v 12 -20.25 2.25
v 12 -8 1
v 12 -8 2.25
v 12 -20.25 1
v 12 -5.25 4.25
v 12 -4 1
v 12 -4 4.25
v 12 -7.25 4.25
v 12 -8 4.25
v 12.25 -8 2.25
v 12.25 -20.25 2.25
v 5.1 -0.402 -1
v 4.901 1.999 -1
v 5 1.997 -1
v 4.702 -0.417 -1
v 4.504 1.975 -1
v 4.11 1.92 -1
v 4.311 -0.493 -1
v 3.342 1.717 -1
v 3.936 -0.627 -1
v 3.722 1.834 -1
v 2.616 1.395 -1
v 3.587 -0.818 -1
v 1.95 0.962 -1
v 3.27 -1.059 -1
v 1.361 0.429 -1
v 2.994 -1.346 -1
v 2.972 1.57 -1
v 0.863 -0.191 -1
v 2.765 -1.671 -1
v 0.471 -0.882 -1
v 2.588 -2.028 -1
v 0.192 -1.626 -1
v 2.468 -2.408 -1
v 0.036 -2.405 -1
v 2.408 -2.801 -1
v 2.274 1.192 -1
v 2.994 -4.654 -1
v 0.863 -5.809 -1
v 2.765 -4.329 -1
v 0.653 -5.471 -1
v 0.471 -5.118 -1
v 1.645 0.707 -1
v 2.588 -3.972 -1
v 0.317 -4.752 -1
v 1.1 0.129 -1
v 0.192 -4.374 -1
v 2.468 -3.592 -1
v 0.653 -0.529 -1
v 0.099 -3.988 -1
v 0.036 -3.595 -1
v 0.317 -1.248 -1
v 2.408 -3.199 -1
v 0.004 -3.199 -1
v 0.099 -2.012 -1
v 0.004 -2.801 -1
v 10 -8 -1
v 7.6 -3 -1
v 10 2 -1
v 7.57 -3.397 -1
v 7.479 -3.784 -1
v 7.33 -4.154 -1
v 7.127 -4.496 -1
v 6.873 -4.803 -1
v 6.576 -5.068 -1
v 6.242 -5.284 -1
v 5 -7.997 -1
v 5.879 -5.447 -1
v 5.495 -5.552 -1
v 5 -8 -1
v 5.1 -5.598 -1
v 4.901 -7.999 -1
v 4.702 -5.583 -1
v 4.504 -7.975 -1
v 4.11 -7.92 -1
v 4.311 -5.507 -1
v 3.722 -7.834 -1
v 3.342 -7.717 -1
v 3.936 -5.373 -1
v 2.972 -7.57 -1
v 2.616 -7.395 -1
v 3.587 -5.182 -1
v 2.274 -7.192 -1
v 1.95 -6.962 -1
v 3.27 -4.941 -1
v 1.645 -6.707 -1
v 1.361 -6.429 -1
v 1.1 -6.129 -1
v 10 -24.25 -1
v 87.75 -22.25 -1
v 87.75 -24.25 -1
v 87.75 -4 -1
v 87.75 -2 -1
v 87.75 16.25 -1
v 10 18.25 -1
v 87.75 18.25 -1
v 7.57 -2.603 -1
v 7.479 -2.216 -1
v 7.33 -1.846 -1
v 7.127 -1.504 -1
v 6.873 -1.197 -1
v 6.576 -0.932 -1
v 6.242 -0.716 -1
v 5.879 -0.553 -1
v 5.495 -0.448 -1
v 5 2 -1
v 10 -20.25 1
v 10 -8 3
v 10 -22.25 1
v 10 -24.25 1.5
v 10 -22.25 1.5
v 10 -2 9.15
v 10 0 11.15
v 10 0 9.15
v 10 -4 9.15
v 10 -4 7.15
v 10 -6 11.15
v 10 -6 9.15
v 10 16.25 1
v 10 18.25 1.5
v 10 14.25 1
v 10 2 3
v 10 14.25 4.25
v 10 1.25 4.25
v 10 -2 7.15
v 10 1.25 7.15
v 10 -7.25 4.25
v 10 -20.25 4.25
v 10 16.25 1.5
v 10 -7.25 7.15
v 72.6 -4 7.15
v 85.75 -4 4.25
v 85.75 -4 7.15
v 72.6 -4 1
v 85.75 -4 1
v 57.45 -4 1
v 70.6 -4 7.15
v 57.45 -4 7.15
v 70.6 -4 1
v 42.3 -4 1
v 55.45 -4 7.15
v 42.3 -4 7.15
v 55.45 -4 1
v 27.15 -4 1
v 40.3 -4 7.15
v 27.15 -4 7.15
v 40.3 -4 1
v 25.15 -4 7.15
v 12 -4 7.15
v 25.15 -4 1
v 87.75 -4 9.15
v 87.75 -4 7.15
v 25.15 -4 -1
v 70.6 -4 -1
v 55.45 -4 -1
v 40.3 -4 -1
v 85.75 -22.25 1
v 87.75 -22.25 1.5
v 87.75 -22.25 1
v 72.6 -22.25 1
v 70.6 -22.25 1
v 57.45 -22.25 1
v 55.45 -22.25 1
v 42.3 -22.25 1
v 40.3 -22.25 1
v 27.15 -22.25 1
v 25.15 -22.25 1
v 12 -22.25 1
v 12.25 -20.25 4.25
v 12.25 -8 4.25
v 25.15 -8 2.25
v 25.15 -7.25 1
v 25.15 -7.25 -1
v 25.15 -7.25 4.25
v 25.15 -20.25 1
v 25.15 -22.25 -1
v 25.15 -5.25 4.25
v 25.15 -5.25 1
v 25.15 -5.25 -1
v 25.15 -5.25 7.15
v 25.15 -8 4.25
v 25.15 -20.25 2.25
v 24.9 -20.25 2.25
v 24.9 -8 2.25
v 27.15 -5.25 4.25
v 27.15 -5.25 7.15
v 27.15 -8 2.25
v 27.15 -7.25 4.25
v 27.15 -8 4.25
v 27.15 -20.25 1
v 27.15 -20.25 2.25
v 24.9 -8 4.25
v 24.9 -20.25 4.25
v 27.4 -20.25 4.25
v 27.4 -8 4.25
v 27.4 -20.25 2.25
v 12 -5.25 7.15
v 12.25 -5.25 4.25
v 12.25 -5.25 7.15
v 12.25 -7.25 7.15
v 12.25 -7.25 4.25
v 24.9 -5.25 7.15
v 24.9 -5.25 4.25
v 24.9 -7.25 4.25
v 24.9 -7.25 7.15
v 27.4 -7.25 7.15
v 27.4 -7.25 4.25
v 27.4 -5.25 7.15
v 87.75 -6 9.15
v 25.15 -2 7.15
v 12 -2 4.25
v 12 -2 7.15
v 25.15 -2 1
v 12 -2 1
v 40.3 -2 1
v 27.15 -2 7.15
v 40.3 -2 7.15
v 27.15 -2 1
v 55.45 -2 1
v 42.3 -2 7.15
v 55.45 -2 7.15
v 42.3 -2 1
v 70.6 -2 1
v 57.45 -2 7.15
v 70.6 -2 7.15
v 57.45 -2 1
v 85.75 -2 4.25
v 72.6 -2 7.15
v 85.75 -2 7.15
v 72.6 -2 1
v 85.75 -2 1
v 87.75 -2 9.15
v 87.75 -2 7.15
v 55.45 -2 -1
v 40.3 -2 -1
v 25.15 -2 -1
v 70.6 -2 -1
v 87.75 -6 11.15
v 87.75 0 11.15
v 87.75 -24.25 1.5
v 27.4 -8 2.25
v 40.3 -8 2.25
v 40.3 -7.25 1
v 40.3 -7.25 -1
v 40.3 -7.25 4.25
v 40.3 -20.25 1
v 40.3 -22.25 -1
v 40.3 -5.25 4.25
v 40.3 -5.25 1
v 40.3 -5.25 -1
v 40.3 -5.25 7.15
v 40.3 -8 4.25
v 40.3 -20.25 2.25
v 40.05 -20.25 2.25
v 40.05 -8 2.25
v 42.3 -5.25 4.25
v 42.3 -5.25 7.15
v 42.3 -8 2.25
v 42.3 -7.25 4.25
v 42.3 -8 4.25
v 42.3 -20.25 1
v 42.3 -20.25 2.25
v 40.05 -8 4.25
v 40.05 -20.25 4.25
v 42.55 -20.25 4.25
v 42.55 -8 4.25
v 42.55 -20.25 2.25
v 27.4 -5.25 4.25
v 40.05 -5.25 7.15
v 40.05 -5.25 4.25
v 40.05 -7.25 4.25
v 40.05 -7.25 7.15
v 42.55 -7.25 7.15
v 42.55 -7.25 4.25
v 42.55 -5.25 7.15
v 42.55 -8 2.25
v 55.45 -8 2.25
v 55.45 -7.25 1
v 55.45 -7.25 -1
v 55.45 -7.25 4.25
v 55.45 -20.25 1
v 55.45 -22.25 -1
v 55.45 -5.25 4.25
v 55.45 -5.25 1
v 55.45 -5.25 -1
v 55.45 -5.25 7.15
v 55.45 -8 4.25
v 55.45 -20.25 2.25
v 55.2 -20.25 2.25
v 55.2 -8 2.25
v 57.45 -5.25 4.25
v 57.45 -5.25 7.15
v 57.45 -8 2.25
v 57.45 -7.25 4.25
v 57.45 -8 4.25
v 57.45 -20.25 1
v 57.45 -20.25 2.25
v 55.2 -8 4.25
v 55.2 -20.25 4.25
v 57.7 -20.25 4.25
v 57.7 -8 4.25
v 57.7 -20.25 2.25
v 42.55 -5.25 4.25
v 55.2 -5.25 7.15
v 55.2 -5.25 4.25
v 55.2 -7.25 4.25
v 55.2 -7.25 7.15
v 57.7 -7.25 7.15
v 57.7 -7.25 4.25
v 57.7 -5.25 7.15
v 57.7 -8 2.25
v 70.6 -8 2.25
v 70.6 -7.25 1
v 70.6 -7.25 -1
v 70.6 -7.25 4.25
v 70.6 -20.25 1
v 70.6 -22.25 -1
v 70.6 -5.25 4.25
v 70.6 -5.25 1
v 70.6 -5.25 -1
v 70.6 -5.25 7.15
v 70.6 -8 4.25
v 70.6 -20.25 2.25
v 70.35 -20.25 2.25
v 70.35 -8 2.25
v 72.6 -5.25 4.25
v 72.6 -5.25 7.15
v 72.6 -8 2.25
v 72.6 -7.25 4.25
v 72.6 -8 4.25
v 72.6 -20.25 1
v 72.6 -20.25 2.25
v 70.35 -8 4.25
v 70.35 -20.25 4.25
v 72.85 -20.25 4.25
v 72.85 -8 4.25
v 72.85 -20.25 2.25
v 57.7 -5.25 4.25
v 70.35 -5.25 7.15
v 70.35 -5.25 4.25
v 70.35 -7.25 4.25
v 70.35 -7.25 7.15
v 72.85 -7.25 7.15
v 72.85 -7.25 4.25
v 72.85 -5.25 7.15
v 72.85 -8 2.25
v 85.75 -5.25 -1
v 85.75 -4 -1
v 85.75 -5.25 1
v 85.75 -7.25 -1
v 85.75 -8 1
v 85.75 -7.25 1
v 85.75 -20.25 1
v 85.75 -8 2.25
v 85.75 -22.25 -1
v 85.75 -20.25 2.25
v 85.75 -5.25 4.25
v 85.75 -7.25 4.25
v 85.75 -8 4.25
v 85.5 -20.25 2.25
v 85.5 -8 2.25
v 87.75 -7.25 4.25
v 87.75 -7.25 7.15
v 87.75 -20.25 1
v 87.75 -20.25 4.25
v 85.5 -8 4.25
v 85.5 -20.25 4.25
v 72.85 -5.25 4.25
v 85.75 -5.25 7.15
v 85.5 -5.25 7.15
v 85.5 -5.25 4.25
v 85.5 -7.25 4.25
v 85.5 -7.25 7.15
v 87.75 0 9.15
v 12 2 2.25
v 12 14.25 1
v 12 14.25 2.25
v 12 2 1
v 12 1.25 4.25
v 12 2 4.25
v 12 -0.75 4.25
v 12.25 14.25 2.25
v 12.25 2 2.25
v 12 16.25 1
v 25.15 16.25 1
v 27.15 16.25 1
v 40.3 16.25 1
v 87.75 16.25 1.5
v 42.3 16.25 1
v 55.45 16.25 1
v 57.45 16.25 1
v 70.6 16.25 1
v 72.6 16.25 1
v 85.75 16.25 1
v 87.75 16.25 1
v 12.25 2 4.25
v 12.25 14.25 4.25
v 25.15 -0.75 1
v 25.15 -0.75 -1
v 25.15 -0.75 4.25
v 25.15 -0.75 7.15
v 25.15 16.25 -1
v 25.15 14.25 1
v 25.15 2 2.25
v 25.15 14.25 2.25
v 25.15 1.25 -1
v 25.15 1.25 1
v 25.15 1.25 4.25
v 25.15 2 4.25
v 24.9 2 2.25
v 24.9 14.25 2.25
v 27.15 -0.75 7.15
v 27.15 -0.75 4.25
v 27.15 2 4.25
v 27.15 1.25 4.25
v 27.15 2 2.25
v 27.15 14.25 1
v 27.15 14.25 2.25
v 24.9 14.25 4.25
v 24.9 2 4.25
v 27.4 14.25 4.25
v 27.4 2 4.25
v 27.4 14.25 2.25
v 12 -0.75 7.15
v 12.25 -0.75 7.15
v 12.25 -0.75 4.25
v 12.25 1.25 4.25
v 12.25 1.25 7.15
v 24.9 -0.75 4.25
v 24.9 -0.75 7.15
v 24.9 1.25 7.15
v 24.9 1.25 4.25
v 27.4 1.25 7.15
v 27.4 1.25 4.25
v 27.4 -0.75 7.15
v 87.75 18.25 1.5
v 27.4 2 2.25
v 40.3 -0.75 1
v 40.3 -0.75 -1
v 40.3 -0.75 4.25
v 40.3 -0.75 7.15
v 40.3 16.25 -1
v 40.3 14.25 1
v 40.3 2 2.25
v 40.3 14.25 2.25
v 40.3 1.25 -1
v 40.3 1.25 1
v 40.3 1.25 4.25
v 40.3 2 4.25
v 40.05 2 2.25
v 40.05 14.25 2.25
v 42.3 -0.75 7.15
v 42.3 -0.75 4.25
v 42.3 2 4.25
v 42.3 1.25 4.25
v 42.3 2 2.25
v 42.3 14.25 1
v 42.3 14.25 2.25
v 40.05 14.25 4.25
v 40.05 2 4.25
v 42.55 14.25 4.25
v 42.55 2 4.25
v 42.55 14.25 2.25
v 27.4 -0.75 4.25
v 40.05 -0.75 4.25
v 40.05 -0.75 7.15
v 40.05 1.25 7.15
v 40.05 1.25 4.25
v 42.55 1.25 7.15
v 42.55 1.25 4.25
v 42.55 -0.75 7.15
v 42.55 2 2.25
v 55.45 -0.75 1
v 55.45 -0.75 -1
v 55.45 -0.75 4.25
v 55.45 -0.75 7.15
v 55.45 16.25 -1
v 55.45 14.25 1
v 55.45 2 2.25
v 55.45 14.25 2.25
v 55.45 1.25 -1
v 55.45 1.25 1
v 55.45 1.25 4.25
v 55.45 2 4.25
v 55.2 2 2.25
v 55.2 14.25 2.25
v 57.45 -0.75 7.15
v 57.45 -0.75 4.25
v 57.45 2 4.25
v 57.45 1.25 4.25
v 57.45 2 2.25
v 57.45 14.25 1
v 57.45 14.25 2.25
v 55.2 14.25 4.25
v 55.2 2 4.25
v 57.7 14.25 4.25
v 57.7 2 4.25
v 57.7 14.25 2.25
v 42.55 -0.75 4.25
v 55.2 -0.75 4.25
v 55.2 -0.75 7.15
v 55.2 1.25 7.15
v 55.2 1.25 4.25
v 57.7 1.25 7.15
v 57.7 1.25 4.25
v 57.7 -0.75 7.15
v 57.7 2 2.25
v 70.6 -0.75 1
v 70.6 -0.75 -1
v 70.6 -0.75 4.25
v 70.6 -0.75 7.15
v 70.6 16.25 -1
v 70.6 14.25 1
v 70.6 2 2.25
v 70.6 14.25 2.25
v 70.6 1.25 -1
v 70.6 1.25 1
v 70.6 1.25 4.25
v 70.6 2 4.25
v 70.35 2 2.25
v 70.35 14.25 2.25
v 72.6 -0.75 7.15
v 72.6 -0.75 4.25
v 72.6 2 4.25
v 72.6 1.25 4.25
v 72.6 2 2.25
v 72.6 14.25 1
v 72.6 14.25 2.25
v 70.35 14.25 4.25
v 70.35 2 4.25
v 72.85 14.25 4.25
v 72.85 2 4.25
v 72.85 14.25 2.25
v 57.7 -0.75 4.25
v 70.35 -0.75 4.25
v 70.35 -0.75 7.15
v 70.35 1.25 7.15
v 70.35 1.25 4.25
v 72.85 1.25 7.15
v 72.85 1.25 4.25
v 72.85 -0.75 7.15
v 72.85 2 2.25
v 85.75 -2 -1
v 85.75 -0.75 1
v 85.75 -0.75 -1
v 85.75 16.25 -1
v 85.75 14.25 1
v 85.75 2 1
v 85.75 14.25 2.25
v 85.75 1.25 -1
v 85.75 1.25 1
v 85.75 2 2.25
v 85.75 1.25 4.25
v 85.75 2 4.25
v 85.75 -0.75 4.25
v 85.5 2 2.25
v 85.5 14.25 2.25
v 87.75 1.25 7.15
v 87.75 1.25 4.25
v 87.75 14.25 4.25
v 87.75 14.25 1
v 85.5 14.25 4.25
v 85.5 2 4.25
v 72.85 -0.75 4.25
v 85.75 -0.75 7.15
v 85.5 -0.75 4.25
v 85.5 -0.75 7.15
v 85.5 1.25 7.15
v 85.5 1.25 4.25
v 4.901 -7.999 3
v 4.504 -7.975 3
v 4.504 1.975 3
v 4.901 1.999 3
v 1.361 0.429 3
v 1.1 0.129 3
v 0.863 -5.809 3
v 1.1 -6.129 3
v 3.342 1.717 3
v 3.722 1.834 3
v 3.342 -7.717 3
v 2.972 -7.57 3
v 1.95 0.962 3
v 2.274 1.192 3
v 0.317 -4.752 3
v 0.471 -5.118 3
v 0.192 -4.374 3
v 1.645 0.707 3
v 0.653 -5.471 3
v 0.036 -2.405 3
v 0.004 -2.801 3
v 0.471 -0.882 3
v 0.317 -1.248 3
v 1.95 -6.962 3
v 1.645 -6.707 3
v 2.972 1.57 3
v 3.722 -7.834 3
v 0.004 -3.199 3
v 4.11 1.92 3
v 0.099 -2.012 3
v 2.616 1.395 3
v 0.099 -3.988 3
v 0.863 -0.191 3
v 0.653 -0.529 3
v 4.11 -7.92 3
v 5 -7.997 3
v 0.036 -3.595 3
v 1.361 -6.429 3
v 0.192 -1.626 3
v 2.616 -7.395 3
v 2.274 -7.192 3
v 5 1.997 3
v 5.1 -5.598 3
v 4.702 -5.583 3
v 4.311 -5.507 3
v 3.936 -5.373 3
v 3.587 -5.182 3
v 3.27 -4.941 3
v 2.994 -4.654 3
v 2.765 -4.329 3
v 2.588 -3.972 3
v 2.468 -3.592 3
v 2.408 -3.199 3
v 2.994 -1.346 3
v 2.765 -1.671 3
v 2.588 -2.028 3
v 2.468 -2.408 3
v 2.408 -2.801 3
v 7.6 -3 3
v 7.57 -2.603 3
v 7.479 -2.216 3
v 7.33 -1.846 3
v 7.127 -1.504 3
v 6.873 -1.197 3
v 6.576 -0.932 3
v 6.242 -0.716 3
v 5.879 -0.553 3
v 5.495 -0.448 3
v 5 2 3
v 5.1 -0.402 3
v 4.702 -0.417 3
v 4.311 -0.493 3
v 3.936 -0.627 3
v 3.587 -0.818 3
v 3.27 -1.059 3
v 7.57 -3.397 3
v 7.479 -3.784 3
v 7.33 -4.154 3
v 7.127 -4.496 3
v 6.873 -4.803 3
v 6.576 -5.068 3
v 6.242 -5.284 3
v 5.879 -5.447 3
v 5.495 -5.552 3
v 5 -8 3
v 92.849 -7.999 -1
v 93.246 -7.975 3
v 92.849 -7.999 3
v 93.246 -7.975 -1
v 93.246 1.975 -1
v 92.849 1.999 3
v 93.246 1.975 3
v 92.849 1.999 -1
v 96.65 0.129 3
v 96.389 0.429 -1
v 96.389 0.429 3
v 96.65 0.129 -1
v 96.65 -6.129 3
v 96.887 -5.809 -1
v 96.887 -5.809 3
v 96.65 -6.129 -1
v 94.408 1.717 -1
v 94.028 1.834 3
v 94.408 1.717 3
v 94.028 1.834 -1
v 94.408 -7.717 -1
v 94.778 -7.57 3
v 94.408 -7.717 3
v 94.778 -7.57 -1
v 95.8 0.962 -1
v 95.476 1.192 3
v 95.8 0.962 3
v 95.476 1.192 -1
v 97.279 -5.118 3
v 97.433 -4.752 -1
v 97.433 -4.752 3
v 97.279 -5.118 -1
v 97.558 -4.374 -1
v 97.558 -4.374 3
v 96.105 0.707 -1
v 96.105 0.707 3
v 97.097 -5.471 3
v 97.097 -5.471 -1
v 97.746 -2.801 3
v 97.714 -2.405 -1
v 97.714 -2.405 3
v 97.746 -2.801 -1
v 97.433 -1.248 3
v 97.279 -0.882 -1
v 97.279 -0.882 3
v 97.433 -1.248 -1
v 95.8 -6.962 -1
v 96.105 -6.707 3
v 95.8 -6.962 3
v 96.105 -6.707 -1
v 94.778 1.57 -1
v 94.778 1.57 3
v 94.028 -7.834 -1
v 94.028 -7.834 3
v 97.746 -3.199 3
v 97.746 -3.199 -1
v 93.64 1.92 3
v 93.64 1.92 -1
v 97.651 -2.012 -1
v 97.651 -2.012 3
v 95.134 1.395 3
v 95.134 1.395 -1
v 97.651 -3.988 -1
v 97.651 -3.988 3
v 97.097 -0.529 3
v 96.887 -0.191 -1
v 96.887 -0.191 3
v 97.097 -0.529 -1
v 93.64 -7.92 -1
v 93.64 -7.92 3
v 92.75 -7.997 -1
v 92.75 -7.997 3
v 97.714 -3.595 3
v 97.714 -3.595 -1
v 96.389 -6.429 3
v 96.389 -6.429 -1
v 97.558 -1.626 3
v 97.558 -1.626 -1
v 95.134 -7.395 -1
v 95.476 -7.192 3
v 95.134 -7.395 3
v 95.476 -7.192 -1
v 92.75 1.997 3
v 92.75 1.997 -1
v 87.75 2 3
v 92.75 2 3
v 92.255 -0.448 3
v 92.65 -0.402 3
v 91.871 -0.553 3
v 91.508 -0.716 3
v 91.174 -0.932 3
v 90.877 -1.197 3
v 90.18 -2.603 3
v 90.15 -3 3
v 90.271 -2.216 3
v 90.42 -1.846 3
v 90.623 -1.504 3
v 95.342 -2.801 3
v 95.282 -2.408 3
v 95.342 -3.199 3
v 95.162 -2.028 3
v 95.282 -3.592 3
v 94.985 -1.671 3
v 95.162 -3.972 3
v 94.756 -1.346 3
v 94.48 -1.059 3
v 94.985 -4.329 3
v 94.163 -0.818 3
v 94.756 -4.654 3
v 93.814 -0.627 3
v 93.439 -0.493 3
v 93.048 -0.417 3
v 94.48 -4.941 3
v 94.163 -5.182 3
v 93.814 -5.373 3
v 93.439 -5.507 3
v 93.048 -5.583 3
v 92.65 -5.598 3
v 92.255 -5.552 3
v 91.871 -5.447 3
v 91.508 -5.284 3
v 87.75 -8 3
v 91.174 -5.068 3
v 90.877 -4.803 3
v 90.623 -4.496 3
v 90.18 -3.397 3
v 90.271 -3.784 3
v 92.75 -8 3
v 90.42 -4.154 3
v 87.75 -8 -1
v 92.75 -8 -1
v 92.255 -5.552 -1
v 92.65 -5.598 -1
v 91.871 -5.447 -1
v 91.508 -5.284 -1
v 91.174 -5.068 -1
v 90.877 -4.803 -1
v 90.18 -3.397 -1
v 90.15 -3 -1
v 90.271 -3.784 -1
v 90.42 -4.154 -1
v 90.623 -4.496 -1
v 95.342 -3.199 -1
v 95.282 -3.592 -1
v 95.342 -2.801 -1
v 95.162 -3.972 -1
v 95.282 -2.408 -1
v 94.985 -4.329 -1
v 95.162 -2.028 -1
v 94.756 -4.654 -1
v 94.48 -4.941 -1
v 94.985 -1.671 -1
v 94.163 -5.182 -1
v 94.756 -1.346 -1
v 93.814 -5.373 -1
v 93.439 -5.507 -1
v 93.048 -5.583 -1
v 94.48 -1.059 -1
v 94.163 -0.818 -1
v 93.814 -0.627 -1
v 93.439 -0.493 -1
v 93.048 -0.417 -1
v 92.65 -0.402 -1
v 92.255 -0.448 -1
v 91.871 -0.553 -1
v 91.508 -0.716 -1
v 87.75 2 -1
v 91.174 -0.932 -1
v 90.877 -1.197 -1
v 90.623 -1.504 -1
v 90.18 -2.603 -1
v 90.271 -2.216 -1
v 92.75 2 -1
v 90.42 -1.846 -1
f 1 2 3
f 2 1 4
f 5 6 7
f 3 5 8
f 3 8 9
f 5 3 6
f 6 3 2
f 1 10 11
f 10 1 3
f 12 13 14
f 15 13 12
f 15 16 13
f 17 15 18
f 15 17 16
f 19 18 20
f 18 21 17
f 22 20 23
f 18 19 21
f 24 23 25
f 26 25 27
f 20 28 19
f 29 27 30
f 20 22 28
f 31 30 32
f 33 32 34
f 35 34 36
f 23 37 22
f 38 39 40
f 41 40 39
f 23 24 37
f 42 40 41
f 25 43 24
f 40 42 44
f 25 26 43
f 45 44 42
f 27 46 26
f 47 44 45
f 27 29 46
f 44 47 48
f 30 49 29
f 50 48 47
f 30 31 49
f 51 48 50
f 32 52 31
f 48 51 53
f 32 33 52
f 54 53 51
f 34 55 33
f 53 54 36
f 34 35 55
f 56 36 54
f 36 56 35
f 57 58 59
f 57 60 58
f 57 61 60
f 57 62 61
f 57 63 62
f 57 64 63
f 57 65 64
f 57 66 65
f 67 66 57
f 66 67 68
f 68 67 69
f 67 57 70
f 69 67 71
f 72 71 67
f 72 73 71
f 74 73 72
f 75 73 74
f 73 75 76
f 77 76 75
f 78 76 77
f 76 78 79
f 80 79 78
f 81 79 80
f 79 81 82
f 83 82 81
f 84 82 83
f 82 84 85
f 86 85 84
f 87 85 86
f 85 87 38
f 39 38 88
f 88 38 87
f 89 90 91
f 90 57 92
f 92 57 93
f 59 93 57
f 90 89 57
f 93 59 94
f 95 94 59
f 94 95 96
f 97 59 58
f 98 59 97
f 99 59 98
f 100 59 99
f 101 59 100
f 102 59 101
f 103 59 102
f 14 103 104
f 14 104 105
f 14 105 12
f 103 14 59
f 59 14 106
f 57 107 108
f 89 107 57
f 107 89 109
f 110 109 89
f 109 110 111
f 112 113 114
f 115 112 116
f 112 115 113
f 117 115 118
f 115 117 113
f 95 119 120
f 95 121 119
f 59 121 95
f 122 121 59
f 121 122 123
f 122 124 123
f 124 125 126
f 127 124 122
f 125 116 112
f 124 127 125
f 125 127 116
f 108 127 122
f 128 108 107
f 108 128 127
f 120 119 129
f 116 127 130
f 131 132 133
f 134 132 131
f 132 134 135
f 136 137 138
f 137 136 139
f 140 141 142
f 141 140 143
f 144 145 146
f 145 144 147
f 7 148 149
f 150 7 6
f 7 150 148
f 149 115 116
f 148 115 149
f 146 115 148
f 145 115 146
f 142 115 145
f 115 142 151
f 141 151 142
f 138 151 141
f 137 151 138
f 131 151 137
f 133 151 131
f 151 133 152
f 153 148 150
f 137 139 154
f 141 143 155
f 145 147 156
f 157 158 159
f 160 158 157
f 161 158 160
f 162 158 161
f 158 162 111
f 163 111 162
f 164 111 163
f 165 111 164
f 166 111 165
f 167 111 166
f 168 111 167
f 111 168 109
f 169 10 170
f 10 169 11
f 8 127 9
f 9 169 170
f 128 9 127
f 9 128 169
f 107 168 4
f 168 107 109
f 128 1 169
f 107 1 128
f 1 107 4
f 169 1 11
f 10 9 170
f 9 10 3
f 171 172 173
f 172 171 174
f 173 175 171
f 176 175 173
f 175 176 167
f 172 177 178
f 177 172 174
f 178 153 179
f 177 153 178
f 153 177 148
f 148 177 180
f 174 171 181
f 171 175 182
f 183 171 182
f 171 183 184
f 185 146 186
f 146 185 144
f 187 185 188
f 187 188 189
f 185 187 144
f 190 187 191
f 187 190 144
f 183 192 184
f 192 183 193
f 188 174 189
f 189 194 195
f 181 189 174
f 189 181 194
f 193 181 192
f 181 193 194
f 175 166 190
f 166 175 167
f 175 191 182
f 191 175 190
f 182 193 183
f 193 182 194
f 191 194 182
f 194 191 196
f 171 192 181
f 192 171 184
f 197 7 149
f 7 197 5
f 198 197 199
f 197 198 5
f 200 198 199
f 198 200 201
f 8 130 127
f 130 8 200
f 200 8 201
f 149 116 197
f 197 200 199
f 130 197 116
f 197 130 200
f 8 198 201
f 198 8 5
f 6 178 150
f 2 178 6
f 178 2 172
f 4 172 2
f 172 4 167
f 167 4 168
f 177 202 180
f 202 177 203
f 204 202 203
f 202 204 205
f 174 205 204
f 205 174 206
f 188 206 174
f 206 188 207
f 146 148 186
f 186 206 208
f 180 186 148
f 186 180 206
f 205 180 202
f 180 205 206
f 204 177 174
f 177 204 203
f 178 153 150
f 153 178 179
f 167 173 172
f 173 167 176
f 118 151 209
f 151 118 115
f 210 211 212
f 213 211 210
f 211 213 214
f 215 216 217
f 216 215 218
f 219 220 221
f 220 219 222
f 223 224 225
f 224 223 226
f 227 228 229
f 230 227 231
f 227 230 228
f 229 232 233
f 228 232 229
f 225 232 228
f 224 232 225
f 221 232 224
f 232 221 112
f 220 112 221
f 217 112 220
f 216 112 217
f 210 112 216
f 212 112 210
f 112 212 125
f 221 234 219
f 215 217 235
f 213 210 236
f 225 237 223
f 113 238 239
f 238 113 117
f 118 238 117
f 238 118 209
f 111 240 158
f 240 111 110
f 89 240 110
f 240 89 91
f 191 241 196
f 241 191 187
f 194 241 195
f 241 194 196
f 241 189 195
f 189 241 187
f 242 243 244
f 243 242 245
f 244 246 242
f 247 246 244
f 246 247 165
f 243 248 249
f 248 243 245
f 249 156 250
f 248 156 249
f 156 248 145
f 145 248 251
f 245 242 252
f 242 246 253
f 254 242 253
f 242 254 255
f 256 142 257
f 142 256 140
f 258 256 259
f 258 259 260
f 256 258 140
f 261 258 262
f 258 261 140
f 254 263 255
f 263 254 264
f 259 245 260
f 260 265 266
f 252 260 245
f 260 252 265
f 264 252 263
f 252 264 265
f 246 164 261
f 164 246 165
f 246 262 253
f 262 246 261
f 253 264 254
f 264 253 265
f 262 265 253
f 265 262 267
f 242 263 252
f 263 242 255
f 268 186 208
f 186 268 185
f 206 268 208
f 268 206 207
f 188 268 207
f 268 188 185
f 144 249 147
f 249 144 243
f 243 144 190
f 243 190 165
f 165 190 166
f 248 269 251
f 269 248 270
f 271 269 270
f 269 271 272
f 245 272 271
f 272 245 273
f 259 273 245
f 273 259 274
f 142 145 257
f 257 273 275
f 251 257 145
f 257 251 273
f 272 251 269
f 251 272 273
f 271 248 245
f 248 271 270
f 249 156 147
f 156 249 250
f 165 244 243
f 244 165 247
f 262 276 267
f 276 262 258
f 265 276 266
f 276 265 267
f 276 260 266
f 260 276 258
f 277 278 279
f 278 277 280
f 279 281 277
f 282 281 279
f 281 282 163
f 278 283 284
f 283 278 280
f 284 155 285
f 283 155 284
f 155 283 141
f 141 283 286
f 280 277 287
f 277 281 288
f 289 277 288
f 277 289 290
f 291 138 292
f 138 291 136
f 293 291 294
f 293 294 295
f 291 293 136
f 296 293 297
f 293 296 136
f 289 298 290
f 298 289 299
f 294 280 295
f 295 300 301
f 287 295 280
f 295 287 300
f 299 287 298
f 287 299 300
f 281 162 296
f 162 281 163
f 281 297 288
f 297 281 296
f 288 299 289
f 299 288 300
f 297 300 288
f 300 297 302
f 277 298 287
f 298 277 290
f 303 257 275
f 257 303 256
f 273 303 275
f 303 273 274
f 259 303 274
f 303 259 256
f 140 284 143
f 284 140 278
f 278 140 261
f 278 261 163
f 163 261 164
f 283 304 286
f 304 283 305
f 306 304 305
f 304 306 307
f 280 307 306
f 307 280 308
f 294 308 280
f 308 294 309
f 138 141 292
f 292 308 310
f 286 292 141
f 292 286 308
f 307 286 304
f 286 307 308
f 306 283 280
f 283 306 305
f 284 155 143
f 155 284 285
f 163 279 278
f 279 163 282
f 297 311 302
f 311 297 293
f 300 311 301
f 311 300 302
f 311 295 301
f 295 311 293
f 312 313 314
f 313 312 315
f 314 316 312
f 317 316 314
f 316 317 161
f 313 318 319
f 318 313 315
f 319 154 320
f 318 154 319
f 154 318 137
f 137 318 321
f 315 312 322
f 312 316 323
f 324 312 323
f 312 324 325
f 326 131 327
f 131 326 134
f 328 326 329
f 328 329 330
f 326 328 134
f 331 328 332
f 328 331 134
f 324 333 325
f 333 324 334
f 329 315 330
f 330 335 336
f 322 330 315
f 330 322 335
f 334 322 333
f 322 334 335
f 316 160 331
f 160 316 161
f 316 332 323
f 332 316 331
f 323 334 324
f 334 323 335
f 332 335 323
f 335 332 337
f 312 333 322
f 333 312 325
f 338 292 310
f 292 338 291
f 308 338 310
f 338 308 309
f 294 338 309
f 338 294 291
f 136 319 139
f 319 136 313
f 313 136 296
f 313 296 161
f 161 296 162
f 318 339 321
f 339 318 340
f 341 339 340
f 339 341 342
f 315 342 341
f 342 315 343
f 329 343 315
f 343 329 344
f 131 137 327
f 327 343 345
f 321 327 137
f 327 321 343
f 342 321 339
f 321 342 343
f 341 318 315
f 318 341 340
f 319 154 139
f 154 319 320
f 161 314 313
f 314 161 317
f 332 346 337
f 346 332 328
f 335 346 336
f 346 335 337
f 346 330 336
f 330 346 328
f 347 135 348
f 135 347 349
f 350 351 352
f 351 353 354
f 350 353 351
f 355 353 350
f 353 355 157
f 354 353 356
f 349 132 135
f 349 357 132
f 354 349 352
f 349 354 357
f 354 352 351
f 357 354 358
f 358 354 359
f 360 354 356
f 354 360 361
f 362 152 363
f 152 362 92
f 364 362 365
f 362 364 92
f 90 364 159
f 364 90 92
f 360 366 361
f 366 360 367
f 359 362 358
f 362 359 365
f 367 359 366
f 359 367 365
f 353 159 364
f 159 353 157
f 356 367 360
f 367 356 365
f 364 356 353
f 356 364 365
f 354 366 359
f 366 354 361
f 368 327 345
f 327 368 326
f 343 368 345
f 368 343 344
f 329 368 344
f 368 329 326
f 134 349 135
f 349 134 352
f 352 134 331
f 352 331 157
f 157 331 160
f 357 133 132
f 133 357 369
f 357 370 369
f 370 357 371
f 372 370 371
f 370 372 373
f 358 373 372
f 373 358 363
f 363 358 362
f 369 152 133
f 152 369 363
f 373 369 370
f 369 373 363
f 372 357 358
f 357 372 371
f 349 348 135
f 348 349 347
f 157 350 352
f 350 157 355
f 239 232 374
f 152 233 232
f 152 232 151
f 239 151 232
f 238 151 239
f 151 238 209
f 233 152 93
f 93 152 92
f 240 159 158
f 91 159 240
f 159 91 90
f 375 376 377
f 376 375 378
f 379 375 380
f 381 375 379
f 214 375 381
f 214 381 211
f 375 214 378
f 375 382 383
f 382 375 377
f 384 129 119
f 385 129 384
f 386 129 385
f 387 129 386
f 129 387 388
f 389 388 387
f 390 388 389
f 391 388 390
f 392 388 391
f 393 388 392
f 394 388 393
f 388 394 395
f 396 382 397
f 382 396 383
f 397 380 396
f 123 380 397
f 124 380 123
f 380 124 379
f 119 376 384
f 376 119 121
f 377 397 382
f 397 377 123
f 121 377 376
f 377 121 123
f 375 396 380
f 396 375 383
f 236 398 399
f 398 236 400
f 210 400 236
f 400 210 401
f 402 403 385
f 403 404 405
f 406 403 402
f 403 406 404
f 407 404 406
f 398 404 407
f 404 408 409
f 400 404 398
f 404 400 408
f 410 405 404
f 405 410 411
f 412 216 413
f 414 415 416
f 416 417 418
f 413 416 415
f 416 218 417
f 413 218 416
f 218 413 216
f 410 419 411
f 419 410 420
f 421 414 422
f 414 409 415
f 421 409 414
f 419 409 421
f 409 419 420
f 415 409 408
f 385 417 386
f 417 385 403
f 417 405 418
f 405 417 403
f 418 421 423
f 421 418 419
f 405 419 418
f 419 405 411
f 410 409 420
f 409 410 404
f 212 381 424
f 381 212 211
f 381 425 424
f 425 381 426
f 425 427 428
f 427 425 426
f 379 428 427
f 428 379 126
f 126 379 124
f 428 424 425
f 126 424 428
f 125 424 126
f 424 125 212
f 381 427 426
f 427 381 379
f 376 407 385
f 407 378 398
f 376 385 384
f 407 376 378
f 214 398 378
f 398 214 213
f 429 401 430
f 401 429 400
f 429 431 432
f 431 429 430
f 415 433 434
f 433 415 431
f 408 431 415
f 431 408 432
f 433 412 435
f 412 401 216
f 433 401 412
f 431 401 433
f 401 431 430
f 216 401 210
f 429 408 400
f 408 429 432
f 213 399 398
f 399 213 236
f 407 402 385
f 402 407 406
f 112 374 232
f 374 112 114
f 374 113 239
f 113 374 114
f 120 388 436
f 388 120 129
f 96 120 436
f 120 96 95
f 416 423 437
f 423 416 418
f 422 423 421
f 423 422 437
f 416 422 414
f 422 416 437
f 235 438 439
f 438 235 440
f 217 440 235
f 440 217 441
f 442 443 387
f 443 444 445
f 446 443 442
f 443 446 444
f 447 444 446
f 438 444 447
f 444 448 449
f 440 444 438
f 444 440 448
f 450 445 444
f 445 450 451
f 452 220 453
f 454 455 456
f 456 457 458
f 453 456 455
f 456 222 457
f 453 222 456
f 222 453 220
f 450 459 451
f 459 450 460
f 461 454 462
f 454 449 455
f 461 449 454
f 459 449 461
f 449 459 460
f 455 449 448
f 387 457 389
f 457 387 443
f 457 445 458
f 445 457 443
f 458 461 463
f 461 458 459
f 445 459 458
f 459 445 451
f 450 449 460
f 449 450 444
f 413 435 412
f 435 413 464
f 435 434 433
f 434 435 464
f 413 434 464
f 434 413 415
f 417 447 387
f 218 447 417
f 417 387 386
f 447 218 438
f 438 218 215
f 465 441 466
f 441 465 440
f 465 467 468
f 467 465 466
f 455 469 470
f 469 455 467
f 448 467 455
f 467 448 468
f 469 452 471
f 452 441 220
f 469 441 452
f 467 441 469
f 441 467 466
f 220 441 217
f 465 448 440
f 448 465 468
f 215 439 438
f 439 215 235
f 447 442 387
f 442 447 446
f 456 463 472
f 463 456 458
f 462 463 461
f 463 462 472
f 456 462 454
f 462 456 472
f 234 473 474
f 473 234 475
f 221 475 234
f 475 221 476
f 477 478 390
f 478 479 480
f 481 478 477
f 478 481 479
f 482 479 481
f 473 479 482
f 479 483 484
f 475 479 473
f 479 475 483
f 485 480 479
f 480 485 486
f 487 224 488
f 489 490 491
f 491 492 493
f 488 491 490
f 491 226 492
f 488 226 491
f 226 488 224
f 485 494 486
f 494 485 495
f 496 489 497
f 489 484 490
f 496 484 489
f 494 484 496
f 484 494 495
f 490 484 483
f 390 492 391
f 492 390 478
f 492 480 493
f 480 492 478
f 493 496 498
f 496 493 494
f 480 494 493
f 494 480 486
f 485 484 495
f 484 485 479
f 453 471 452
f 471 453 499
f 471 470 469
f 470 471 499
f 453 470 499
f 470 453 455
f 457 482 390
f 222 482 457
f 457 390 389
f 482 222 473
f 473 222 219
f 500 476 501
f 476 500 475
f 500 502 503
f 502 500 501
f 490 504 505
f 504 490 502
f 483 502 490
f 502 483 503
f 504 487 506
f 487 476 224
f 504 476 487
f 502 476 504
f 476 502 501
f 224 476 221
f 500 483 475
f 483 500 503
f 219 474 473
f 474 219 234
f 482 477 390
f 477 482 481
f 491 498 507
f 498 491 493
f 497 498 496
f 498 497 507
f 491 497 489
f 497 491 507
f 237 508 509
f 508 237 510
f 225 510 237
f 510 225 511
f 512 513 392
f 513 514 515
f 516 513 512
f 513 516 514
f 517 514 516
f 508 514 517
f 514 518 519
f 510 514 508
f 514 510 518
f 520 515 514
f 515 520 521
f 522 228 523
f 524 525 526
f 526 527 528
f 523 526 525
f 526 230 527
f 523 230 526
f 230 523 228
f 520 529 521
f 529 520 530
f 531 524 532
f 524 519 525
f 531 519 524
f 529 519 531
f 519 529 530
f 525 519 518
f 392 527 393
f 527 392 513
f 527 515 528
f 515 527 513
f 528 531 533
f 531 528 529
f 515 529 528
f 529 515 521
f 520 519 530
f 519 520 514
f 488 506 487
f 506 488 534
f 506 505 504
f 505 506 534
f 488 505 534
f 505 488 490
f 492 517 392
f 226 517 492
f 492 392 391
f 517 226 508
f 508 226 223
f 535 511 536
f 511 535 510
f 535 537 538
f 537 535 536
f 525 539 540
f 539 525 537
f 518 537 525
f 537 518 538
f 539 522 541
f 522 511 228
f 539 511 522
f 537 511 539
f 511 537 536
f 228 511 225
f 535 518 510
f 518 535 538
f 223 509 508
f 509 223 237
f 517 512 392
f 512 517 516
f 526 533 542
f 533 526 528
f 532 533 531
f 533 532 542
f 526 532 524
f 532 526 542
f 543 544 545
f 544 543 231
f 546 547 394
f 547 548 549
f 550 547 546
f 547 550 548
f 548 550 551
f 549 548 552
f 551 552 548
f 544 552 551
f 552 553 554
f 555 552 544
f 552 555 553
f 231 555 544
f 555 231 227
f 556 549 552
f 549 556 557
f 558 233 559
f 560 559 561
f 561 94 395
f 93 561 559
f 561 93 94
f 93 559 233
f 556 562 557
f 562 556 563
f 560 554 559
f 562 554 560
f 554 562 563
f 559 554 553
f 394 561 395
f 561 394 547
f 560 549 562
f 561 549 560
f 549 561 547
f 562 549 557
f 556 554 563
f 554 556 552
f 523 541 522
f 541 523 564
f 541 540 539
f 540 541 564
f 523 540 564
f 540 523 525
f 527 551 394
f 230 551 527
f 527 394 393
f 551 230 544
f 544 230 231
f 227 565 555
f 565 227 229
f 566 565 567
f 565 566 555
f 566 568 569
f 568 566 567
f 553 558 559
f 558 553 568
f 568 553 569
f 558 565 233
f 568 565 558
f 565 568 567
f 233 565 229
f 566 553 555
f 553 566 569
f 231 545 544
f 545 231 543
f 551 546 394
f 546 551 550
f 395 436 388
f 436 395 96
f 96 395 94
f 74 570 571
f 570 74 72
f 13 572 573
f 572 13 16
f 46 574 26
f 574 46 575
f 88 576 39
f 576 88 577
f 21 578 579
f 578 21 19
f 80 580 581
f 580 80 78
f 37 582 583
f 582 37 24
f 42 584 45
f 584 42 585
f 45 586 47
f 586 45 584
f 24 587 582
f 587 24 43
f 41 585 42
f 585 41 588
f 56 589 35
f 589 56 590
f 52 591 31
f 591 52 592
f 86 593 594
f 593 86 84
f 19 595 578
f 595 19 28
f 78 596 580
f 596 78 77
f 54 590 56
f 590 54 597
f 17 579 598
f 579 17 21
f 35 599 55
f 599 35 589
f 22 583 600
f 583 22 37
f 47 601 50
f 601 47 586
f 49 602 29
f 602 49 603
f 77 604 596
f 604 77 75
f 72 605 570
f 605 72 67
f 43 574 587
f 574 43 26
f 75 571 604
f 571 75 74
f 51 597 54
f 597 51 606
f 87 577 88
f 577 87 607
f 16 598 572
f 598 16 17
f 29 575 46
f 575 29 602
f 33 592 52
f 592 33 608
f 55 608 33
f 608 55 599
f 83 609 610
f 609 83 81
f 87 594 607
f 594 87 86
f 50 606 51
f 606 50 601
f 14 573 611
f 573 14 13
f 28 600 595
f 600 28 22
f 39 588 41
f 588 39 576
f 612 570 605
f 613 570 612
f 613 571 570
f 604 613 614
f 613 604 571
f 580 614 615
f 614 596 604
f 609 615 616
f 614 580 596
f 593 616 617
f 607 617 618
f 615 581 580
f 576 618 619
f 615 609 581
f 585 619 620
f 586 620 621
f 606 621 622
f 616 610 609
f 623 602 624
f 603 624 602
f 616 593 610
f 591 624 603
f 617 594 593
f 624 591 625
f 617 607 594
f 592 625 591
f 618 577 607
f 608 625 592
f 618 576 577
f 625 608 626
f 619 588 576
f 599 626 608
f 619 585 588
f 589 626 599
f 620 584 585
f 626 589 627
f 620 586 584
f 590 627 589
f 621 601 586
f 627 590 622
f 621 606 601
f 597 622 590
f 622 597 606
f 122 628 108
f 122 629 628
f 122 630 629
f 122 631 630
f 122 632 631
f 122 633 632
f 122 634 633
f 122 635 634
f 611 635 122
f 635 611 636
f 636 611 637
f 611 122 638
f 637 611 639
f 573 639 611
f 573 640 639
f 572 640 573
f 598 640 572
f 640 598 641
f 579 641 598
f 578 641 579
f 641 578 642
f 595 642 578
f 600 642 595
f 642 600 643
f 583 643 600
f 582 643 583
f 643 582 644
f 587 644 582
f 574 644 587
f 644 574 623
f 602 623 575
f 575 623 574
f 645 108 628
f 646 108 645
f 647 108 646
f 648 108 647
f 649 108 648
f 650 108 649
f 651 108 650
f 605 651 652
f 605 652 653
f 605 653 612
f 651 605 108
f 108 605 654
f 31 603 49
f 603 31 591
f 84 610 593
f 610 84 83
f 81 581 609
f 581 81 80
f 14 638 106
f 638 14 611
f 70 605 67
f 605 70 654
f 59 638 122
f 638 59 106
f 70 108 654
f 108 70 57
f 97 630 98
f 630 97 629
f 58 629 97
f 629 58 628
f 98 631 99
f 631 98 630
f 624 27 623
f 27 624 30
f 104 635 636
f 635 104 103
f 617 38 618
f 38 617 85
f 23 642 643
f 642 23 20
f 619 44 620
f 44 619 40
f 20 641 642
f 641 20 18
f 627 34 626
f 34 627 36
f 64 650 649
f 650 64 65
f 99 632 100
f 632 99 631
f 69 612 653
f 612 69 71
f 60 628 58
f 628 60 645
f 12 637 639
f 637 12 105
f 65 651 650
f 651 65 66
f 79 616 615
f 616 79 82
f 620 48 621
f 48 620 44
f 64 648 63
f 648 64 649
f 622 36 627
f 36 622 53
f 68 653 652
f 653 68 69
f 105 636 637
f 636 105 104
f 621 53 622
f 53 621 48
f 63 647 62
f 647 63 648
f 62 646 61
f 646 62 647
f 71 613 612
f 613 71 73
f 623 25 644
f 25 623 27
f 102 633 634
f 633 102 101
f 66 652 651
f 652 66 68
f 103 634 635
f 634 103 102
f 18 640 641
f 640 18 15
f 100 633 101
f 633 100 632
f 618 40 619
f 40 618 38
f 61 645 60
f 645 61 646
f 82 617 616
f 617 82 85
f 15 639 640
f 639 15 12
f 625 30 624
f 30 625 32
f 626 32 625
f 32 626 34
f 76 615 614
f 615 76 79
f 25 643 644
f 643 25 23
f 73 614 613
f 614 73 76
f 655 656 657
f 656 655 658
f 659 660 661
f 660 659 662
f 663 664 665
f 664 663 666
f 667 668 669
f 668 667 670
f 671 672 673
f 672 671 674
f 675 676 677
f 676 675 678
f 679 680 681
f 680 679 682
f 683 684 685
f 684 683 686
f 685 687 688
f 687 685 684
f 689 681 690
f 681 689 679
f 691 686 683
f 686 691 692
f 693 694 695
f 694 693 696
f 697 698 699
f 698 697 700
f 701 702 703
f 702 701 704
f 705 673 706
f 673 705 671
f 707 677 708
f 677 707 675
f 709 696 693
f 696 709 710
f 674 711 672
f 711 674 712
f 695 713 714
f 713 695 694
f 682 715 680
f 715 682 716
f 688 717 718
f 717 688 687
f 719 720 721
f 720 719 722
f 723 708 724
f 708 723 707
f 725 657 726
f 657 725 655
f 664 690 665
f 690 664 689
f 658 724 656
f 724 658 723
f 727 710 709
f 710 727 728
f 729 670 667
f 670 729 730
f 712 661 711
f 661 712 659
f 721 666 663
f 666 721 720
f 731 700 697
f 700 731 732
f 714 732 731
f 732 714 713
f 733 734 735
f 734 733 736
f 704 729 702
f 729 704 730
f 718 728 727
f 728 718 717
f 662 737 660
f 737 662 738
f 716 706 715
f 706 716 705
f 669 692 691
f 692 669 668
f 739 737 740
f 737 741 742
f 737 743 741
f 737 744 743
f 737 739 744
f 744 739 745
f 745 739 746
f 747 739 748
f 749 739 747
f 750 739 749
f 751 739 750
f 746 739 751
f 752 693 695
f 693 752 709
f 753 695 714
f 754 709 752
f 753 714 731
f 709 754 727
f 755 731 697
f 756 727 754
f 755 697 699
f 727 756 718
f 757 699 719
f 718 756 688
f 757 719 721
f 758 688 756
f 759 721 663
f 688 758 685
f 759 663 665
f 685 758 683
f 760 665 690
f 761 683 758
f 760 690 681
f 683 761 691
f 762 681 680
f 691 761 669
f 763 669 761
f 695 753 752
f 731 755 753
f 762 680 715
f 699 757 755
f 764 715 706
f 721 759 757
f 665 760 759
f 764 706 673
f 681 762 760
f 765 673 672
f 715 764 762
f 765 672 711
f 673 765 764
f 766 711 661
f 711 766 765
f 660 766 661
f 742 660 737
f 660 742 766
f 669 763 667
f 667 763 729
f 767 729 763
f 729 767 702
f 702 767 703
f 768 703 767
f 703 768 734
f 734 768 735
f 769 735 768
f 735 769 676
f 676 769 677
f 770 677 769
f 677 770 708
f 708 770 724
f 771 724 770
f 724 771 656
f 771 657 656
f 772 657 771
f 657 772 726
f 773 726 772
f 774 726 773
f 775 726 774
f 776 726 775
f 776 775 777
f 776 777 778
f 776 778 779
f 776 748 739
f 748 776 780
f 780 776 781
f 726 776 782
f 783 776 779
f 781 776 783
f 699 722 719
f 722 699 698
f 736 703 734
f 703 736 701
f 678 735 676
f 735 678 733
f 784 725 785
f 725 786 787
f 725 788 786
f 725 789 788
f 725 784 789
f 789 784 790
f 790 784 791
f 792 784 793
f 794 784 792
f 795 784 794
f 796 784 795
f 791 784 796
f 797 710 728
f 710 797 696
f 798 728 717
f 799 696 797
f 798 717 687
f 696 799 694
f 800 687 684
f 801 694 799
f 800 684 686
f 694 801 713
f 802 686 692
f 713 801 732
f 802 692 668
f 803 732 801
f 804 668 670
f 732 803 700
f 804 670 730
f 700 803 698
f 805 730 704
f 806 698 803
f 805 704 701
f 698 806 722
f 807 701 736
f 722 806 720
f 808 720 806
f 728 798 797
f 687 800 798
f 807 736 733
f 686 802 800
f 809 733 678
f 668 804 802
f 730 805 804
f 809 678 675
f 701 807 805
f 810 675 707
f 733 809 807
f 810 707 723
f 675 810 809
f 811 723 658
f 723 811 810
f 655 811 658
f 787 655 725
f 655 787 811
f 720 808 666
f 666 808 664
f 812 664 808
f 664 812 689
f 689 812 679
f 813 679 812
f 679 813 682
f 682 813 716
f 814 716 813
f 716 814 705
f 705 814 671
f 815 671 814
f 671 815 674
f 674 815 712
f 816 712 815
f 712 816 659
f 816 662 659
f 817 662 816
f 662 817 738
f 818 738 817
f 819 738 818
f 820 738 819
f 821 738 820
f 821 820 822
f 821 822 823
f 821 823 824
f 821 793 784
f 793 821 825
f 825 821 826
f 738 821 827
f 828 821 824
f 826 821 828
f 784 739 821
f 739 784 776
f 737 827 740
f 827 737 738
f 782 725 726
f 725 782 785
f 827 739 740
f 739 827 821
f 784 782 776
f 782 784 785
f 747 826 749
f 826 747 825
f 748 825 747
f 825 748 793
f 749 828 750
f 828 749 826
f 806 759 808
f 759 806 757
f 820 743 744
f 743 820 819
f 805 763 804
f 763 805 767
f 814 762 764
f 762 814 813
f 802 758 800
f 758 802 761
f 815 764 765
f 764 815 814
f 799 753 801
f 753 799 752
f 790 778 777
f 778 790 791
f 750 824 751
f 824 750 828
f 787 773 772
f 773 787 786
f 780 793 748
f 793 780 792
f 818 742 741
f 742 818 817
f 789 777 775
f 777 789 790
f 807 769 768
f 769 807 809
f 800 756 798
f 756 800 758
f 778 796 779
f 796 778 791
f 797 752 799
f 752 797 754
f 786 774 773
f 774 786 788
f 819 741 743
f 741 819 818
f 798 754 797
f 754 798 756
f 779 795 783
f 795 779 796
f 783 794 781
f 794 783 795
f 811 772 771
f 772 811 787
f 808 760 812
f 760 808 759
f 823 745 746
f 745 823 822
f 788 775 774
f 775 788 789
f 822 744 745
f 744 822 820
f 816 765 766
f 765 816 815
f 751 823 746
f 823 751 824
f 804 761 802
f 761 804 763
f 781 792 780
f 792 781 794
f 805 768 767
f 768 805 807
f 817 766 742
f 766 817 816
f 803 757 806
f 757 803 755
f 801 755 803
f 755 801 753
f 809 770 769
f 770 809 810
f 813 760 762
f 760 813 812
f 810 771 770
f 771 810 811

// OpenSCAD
// ////////////////////////////////////////////////
//
// WAGO 221 mount
//
// Creates a single row or double row set of 221 blocks
// with mounting tabs/ears at either end.
//
// Created - 2017/01/01 by Joo Chung
//
// ////////////////////////////////////////////////

// ////////////////////////////////////////////////
// vector of blocks. each element specifies the number of conductors for that block
// EDIT THIS
blocks = [ 2, 2, 2, 2, 2 ]; // a single 5 conductor blocks
// blocks = [5, 3, 2]; // a set of 5 conductor, 3 conductor, 2 conductor blocks
// blocks = [5, 5, 5]; // a set of three 5 conductor blocks
// blocks = [2]; // a single 2 conductor block
// blocks = [3]; // a single 3 conductor block

// ////////////////////////////////////////////////
// Mirror the mount, stand it up, and put tabs on bottom.
// 0 - no mirror, 1 - mirror, rotate so its standing up, and reposition tabs
// 2 - mirror, rotate so that they are laying flat, and reposition tabs.
// EDIT THIS
mirror = 2;

// ////////////////////////////////////////////////
// Tabs - include or exclude mounting tabs
// EDIT THIS: 0 - no tabs, 1 - tabs
tabs = 1;
// EDIT THIS: radius of hole in tab
tabradius = 2.6;
// EDIT THIS: thickness of tab
tabheight = 4;
// EDIT THIS: Set width and length of the tab. (tab is basically a square)
tabwidth = 10;

// ////////////////////////////////////////////////
// Block dimensions in mm -- DO NOT EDIT
conwidth = 5.6; // width of a single conductor
// DO NOT EDIT
border = 1.75; // block transparent plastic border
// DO NOT EDIT
blockdepth = 18.25;
// DO NOT EDIT
fudge = 0.2;

// ////////////////////////////////////////////////
// OpenSCAD special variables -- DO NOT EDIT
$fa = 1;
// DO NOT EDIT
$fs = 0.4;

// ////////////////////////////////////////////////
// Functions
function bw(x) = conwidth * x + border + fudge; // block width
function mw(i, n) = (i == 0 ? bw(blocks[i]) + 2 + mw(i + 1, n)
                            : (i < n ? bw(blocks[i]) + 2 + mw(i + 1, n) : 0)); // mount width (index, max index)

// ////////////////////////////////////////////////
// Modules
module tab(width, hole, thickness)
{
    difference()
    {
        union()
        {
            cylinder(thickness, width / 2, width / 2, true);
            translate([ width / 4, 0, 0 ]) cube([ width / 2, width, thickness ], true);
        }
        cylinder(width, hole, hole, true);
    }
}

module shoulder(depth)
{
    difference()
    {
        union()
        {
            cube([ 2, blockdepth, 3.25 ], false);
            translate([ 0, 0, 3.25 ]) cube([ 2.25, blockdepth, 2 ], false);
        }
        translate([ 0, 0, 2 ]) cube([ 2.25, 2, 3.25 ], false);
        translate([ 2, blockdepth - 4, 2 ]) cube([ 0.25, 4, 3.25 ], false);
    }
}

module backshoulder(height)
{
    difference()
    {
        union()
        {
            translate([ 0, 2, 0 ]) cube([ 2, 1.25, 10.15 ]);
            cube([ 2.25, 2, 10.15 ]);
        }
        translate([ 0, 0, 10.15 - 2 ]) cube([ 2.25, 3.25, 2 ]);
        translate([ 2, 0, 2 ]) cube([ 1.25, 3.25, 3.25 ]);
    }
}

// WAGO 221 block
module block(nconn)
{
    blockwidth = bw(nconn);

    // base
    translate([ 2, 2, 0 ]) cube([ blockwidth, blockdepth, 2 ], false);

    // back headboard
    translate([ 0, blockdepth + 2, 0 ]) cube([ blockwidth + 4, 2, 10.15 ], false);

    // back lip
    translate([ 0, blockdepth, 10.15 ]) cube([ blockwidth + 4, 4, 2 ], false);

    // front lip
    translate([ 0, 0, 0 ]) cube([ blockwidth + 4, 2, 2.5 ], false);

    // left shoulder and right shoulders
    translate([ 0, 2, 0 ]) shoulder();
    translate([ blockwidth + 4, 2, 0 ]) mirror([ 1, 0, 0 ]) shoulder();

    // back left and shoulder
    translate([ 0, blockdepth - 1.25, 0 ]) backshoulder();
    translate([ blockwidth + 4, blockdepth - 1.25, 0 ]) mirror([ 1, 0, 0 ]) backshoulder();
}

// ////////////////////////////////////////////////
// MAIN BODY

mountwidth = mw(0, len(blocks));
if (mirror == 0)
{ // No mirror. Single row of blocks
    // create array of blocks
    for (i = [0:len(blocks) - 1])
    {
        offset = (i == 0) ? tabwidth : tabwidth + mw(0, i);
        translate([ offset, 0, 0 ]) block(blocks[i]);
    }

    // left and right tabs
    if (tabs == 1)
    {
        translate([ tabwidth / 2, (blockdepth + 4) / 2, tabheight / 2 ]) tab(tabwidth, tabradius, tabheight);
        translate([ mountwidth + 2 + tabwidth + tabwidth / 2, (blockdepth + 4) / 2, tabheight / 2 ]) mirror([ 1, 0, 0 ])
            tab(tabwidth, tabradius, tabheight);
    }
}
else if (mirror == 1)
{ // Mirrored. two rows of blocks, back to back.
    // Row #1. Stand up on headboard.
    rotate([ -90, 0, 0 ]) for (i = [0:len(blocks) - 1])
    {
        offset = (i == 0) ? tabwidth : tabwidth + mw(0, i);
        translate([ offset, 0, -1 ]) block(blocks[i]);
    }

    // Row #2. Opposite rotation. Stand up on headbord
    rotate([ 90, 0, 0 ]) mirror([ 0, 1, 0 ]) for (i = [0:len(blocks) - 1])
    {
        offset = (i == 0) ? tabwidth : tabwidth + mw(0, i);
        translate([ offset, 0, -1 ]) block(blocks[i]);
    }

    // left and right tabs
    if (tabs == 1)
    {
        translate([ tabwidth / 2, 0, -blockdepth - tabheight / 2 ]) tab(tabwidth, tabradius, tabheight);
        translate([ mountwidth + 2 + tabwidth + tabwidth / 2, 0, -blockdepth - tabheight / 2 ]) mirror([ 1, 0, 0 ])
            tab(tabwidth, tabradius, tabheight);
    }
}
else if (mirror == 2)
{
    // Row #1.
    for (i = [0:len(blocks) - 1])
    {
        offset = (i == 0) ? tabwidth : tabwidth + mw(0, i);
        translate([ offset, -blockdepth - 6, -1 ]) block(blocks[i]);
    }

    // Row #2. Flip
    mirror([ 0, 1, 0 ]) for (i = [0:len(blocks) - 1])
    {
        offset = (i == 0) ? tabwidth : tabwidth + mw(0, i);
        translate([ offset, -blockdepth, -1 ]) block(blocks[i]);
    }

    // left and right tabs
    if (tabs == 1)
    {
        translate([ tabwidth / 2, -3, (tabheight - 2) / 2 ]) tab(tabwidth, tabradius, tabheight);
        translate([ mountwidth + 2 + tabwidth + tabwidth / 2, -3, (tabheight - 2) / 2 ]) mirror([ 1, 0, 0 ])
            tab(tabwidth, tabradius, tabheight);
    }
}
